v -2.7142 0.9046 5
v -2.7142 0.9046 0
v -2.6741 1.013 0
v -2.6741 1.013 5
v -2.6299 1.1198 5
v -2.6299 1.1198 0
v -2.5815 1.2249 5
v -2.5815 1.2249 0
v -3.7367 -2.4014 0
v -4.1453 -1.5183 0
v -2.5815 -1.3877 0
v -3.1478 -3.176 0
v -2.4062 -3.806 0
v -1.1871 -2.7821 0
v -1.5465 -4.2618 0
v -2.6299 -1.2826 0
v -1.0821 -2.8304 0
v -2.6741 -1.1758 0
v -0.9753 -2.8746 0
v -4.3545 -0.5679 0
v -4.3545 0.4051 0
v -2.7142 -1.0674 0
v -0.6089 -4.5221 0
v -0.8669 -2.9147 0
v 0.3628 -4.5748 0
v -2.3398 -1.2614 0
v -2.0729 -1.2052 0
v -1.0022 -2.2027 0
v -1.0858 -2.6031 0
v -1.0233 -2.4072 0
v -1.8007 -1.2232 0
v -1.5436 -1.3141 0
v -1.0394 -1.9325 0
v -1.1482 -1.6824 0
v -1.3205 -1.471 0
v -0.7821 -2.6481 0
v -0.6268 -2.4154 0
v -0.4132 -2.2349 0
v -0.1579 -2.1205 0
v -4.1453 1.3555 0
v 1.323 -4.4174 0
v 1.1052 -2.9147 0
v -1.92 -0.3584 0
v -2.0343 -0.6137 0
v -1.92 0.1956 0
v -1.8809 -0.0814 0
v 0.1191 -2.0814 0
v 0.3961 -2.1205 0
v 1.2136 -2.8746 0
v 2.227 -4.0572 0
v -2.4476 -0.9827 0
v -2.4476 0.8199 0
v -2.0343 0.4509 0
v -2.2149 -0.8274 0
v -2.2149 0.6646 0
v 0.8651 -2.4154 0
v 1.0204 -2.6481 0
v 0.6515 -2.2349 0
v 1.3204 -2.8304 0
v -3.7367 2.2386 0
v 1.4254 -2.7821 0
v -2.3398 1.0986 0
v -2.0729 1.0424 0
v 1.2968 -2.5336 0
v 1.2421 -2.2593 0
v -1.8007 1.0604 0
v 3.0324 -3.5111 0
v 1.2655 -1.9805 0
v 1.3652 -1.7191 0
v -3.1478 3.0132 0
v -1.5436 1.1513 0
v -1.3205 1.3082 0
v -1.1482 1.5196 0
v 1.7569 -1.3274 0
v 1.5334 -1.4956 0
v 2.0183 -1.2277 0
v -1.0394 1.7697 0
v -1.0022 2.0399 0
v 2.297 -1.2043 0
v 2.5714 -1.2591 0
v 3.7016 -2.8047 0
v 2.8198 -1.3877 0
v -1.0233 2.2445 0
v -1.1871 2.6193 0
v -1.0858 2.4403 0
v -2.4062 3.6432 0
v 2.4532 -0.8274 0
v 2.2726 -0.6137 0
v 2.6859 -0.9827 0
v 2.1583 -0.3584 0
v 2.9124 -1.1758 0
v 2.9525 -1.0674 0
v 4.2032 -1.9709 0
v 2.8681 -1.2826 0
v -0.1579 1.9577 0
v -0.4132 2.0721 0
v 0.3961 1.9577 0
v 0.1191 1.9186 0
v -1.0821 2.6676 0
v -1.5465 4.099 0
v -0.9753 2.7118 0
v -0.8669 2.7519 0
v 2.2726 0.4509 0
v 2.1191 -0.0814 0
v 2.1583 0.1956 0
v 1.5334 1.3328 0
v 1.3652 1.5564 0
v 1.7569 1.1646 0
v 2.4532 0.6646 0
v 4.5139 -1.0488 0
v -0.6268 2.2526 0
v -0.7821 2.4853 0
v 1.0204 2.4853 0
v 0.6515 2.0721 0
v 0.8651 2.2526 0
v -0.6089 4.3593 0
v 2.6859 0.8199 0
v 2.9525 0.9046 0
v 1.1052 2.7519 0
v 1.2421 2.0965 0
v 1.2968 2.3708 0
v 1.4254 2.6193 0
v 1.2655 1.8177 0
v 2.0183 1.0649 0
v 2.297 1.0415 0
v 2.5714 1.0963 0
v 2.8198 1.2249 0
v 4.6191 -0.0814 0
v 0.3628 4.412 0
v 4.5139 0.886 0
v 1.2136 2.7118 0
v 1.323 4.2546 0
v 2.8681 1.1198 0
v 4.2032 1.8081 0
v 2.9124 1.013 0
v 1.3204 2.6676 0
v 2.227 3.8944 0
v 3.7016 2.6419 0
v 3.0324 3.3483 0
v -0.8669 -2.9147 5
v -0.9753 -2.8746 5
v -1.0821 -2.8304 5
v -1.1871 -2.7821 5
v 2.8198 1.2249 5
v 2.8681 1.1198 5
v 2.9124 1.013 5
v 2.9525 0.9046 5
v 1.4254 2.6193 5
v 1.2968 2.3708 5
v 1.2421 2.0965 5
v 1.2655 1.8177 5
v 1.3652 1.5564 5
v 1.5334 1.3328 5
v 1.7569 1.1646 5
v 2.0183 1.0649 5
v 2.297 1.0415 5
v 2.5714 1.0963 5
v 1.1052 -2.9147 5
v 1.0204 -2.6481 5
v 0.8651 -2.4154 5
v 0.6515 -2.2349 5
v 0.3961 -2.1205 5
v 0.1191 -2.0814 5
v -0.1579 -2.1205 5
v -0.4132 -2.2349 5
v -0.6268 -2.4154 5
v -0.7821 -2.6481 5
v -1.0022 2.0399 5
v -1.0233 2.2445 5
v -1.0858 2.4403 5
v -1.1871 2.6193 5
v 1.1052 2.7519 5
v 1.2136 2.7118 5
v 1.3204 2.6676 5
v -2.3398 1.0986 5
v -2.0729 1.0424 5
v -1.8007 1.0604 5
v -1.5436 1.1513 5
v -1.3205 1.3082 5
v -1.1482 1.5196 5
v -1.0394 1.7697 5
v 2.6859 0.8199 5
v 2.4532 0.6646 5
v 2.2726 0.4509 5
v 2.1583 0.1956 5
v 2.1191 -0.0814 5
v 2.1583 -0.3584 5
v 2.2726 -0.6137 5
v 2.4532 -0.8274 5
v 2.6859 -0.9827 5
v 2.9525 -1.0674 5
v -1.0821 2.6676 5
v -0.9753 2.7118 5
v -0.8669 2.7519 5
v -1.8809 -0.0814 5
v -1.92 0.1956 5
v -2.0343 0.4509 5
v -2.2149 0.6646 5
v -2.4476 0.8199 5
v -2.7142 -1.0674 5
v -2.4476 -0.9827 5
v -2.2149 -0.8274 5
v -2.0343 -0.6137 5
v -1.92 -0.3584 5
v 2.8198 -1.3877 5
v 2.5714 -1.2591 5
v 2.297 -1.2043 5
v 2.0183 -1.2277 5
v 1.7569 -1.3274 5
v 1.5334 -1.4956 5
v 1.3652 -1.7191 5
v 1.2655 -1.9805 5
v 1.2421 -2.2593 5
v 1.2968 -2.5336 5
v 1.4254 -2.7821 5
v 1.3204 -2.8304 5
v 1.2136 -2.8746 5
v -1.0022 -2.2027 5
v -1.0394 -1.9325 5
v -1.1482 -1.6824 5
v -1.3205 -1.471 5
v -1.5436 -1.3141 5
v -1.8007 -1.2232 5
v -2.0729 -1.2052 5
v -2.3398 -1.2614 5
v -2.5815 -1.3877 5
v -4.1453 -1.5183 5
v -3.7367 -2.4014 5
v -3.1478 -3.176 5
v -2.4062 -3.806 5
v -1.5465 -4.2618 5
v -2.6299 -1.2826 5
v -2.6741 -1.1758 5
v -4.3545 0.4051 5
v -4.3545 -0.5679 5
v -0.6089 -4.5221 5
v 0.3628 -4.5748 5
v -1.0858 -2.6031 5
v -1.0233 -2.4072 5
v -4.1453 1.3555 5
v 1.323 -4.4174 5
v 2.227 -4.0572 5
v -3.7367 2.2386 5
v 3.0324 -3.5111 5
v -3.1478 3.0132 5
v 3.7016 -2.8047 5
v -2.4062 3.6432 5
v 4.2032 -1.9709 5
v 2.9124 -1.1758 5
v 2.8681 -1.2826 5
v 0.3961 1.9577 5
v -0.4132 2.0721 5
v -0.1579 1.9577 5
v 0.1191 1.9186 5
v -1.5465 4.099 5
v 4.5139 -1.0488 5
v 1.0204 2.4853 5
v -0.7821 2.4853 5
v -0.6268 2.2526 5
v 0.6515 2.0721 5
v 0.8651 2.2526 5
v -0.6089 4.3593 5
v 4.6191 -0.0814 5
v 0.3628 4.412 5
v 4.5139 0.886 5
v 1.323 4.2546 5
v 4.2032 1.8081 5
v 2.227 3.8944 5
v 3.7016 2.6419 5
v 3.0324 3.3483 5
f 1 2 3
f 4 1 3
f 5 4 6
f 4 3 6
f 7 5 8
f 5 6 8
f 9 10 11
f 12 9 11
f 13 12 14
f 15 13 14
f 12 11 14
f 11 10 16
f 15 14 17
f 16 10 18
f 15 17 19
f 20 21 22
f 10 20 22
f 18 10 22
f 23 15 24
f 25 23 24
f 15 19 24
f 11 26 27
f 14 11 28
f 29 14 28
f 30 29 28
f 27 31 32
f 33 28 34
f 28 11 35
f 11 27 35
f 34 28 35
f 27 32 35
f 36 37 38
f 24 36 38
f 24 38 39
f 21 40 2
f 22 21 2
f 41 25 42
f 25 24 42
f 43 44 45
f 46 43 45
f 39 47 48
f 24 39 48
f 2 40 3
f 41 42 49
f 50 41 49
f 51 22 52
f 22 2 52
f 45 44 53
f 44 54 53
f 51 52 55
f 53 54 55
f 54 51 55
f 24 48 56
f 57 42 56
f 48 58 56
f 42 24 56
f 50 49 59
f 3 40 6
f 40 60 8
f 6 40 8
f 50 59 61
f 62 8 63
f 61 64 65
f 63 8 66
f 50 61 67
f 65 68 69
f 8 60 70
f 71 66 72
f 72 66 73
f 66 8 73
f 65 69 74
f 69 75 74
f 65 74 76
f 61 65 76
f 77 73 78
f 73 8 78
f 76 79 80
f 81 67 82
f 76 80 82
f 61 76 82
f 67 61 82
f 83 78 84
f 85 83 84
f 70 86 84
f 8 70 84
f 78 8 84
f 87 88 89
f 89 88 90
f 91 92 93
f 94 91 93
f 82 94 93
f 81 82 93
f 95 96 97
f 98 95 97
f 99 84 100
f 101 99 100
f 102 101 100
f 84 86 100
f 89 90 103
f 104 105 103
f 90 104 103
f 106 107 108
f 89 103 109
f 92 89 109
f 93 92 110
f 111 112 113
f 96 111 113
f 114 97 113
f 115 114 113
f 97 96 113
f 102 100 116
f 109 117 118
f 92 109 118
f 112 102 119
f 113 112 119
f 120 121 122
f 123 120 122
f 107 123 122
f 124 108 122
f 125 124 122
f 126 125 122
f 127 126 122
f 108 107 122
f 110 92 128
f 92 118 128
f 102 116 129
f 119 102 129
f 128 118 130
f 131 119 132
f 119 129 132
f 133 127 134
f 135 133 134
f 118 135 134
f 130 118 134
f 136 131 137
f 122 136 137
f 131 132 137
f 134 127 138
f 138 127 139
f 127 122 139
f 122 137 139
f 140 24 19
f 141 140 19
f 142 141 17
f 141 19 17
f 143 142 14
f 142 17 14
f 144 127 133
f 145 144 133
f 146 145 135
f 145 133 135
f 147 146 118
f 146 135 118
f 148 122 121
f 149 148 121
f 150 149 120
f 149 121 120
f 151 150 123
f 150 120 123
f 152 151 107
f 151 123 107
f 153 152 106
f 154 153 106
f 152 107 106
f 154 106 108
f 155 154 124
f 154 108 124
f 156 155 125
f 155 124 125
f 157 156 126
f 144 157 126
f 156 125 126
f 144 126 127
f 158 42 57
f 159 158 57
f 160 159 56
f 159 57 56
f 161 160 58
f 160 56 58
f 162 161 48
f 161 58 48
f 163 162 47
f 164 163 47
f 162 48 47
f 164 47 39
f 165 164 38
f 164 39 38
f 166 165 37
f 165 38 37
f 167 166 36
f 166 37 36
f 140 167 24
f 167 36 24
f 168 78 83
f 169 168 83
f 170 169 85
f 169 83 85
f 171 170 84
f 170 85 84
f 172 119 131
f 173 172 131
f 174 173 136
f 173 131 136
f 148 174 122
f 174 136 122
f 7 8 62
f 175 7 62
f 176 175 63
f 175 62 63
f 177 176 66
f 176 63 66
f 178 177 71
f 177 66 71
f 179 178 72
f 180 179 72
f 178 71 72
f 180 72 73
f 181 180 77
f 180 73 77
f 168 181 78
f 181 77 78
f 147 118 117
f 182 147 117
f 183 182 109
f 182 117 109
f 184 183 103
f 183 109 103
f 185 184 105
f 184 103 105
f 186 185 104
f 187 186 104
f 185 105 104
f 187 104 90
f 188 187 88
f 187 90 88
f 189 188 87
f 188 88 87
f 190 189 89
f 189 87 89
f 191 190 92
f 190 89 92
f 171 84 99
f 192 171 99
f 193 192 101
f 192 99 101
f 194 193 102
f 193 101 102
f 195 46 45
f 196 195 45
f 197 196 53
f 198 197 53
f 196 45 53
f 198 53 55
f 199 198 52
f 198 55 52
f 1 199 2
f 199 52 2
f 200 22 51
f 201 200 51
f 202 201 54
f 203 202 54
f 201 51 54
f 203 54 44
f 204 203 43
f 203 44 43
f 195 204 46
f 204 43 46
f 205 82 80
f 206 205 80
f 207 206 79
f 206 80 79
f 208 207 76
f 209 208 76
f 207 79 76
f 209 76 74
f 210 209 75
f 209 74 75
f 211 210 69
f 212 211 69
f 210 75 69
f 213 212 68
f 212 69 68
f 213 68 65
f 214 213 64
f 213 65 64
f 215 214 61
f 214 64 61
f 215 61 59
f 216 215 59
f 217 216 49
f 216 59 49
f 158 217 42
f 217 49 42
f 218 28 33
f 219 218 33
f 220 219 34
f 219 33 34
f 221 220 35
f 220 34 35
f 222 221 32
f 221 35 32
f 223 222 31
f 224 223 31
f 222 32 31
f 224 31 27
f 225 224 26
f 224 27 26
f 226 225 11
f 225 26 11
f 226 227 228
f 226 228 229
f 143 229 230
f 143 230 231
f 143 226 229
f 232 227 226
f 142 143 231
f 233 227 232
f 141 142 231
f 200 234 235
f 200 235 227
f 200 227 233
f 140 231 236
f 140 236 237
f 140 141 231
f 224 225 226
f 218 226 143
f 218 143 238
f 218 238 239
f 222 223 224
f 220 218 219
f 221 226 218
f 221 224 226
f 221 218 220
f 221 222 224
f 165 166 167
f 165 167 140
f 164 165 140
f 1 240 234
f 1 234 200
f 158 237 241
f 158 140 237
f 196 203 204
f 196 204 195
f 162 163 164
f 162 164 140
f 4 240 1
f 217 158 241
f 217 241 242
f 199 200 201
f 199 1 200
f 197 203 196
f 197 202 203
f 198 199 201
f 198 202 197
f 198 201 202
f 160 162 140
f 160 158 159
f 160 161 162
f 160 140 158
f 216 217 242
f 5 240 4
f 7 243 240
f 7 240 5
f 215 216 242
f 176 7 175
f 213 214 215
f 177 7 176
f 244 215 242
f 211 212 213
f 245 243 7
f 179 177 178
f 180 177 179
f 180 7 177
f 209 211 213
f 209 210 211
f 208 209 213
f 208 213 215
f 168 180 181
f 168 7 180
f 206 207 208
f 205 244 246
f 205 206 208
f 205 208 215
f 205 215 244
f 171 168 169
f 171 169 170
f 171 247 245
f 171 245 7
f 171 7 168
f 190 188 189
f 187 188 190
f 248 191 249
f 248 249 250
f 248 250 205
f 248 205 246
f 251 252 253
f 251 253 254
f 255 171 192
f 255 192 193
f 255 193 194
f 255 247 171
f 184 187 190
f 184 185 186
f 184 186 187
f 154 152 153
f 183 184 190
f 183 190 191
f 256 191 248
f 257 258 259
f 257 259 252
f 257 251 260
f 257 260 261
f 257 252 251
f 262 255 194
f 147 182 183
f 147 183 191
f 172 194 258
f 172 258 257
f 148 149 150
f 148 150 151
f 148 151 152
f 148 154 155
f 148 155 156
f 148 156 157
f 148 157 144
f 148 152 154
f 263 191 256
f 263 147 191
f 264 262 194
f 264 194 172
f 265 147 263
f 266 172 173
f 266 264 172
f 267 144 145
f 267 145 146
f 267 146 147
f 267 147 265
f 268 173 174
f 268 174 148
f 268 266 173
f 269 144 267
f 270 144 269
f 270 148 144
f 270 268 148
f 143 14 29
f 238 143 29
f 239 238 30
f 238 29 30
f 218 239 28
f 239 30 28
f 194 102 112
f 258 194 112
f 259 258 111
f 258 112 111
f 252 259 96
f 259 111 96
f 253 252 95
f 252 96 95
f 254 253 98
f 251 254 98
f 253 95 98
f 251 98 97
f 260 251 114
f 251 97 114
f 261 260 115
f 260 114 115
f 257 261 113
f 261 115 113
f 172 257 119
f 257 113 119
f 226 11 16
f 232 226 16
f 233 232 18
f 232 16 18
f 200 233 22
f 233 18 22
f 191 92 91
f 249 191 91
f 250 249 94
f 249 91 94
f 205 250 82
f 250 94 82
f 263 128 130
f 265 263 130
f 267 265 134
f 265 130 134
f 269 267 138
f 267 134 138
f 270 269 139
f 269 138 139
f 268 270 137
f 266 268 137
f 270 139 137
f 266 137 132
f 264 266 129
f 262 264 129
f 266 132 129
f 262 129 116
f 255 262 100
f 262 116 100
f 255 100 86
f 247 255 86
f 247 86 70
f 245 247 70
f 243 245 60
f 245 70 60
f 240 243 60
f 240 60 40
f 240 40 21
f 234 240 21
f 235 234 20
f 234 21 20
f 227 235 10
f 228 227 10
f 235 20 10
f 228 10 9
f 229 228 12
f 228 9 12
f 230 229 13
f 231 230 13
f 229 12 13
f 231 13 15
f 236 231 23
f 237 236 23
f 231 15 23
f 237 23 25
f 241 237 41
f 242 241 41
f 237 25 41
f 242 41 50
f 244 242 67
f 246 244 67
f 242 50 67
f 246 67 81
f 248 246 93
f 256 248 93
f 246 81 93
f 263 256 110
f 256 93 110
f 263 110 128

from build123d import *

# Parameters (mm, degrees)
F0_R     = 4.5
F1_DEPTH = 5


with BuildPart() as f1:
    # F0 (on Top) → F1 (new body)
    with BuildSketch(Plane.XY):
        with Locations((0.1191368252, -0.0813986216)):
            Circle(F0_R)
        with BuildLine():
            ThreePointArc((2.8198227273, 1.224853903), (2.8907754227, 1.0666516755), (2.9524701585, 0.9046146756))
            ThreePointArc((2.9524701585, 0.9046146756), (3.7646340496, 0.6823639942), (4.1191368252, -0.0813986216))
            ThreePointArc((4.1191368252, -0.0813986216), (3.7646340496, -0.8451612374), (2.9524701585, -1.0674119188))
            ThreePointArc((2.9524701585, -1.0674119188), (2.8907754227, -1.2294489187), (2.8198227273, -1.3876511462))
            ThreePointArc((2.8198227273, -1.3876511462), (3.129098142, -1.7441154101), (3.2404571688, -2.2027189652))
            ThreePointArc((3.2404571688, -2.2027189652), (2.5445395433, -3.155364707), (1.4253893498, -2.7820845237))
            ThreePointArc((1.4253893498, -2.7820845237), (1.2671871223, -2.8530372191), (1.1051501224, -2.9147319549))
            ThreePointArc((1.1051501224, -2.9147319549), (1.1156340147, -2.9977723613), (1.1191368252, -3.0813986216))
            ThreePointArc((1.1191368252, -3.0813986216), (0.0355105649, -4.0778958111), (-0.866876472, -2.9147319549))
            ThreePointArc((-0.866876472, -2.9147319549), (-1.0289134719, -2.8530372191), (-1.1871156994, -2.7820845237))
            ThreePointArc((-1.1871156994, -2.7820845237), (-2.7092902995, -2.9098257463), (-2.5815490769, -1.3876511462))
            ThreePointArc((-2.5815490769, -1.3876511462), (-2.6525017723, -1.2294489187), (-2.7141965081, -1.0674119188))
            ThreePointArc((-2.7141965081, -1.0674119188), (-3.8808631748, -0.0813986216), (-2.7141965081, 0.9046146756))
            ThreePointArc((-2.7141965081, 0.9046146756), (-2.6525017723, 1.0666516755), (-2.5815490769, 1.224853903))
            ThreePointArc((-2.5815490769, 1.224853903), (-2.7092902995, 2.7470285031), (-1.1871156994, 2.6192872805))
            ThreePointArc((-1.1871156994, 2.6192872805), (-1.0289134719, 2.6902399759), (-0.866876472, 2.7519347117))
            ThreePointArc((-0.866876472, 2.7519347117), (0.0355105649, 3.9150985679), (1.1191368252, 2.9186013784))
            ThreePointArc((1.1191368252, 2.9186013784), (1.1156340147, 2.8349751181), (1.1051501224, 2.7519347117))
            ThreePointArc((1.1051501224, 2.7519347117), (1.2671871223, 2.6902399759), (1.4253893498, 2.6192872805))
            ThreePointArc((1.4253893498, 2.6192872805), (2.5445395433, 2.9925674638), (3.2404571688, 2.039921722))
            ThreePointArc((3.2404571688, 2.039921722), (3.129098142, 1.5813181669), (2.8198227273, 1.224853903))
        make_face(mode=Mode.SUBTRACT)
        with BuildLine():
            ThreePointArc((2.9524701585, -1.0674119188), (3.0771767168, -0.5813986216), (3.1191368252, -0.0813986216))
            ThreePointArc((3.1191368252, -0.0813986216), (3.0771767168, 0.4186013784), (2.9524701585, 0.9046146756))
            ThreePointArc((2.9524701585, 0.9046146756), (2.1191368252, -0.0813986216), (2.9524701585, -1.0674119188))
        make_face()
        with BuildLine():
            ThreePointArc((2.9524701585, 0.9046146756), (3.0771767168, 0.4186013784), (3.1191368252, -0.0813986216))
            ThreePointArc((3.1191368252, -0.0813986216), (3.0771767168, -0.5813986216), (2.9524701585, -1.0674119188))
            ThreePointArc((2.9524701585, -1.0674119188), (3.7646340496, -0.8451612374), (4.1191368252, -0.0813986216))
            ThreePointArc((4.1191368252, -0.0813986216), (3.7646340496, 0.6823639942), (2.9524701585, 0.9046146756))
        make_face()
        with BuildLine():
            ThreePointArc((1.4253893498, 2.6192872805), (1.5333503876, 1.3328149408), (2.8198227273, 1.224853903))
            ThreePointArc((2.8198227273, 1.224853903), (2.2404571688, 2.039921722), (1.4253893498, 2.6192872805))
        make_face()
        with BuildLine():
            ThreePointArc((1.4253893498, 2.6192872805), (2.2404571688, 2.039921722), (2.8198227273, 1.224853903))
            ThreePointArc((2.8198227273, 1.224853903), (3.129098142, 1.5813181669), (3.2404571688, 2.039921722))
            ThreePointArc((3.2404571688, 2.039921722), (2.5445395433, 2.9925674638), (1.4253893498, 2.6192872805))
        make_face()
        with BuildLine():
            ThreePointArc((3.2404571688, -2.2027189652), (3.129098142, -1.7441154101), (2.8198227273, -1.3876511462))
            ThreePointArc((2.8198227273, -1.3876511462), (2.2404571688, -2.2027189652), (1.4253893498, -2.7820845237))
            ThreePointArc((1.4253893498, -2.7820845237), (2.5445395433, -3.155364707), (3.2404571688, -2.2027189652))
        make_face()
        with BuildLine():
            ThreePointArc((1.4253893498, -2.7820845237), (2.2404571688, -2.2027189652), (2.8198227273, -1.3876511462))
            ThreePointArc((2.8198227273, -1.3876511462), (1.5333503876, -1.495612184), (1.4253893498, -2.7820845237))
        make_face()
        with BuildLine():
            ThreePointArc((-0.866876472, 2.7519347117), (0.1191368252, 1.9186013784), (1.1051501224, 2.7519347117))
            ThreePointArc((1.1051501224, 2.7519347117), (0.1191368252, 2.9186013784), (-0.866876472, 2.7519347117))
        make_face()
        with BuildLine():
            ThreePointArc((-0.866876472, 2.7519347117), (0.1191368252, 2.9186013784), (1.1051501224, 2.7519347117))
            ThreePointArc((1.1051501224, 2.7519347117), (1.1156340147, 2.8349751181), (1.1191368252, 2.9186013784))
            ThreePointArc((1.1191368252, 2.9186013784), (0.0355105649, 3.9150985679), (-0.866876472, 2.7519347117))
        make_face()
        with BuildLine():
            ThreePointArc((1.1191368252, -3.0813986216), (1.1156340147, -2.9977723613), (1.1051501224, -2.9147319549))
            ThreePointArc((1.1051501224, -2.9147319549), (0.1191368252, -3.0813986216), (-0.866876472, -2.9147319549))
            ThreePointArc((-0.866876472, -2.9147319549), (0.0355105649, -4.0778958111), (1.1191368252, -3.0813986216))
        make_face()
        with BuildLine():
            ThreePointArc((-0.866876472, -2.9147319549), (0.1191368252, -3.0813986216), (1.1051501224, -2.9147319549))
            ThreePointArc((1.1051501224, -2.9147319549), (0.1191368252, -2.0813986216), (-0.866876472, -2.9147319549))
        make_face()
        with BuildLine():
            ThreePointArc((-1.0021835184, 2.039921722), (-1.0495377765, 2.3440040965), (-1.1871156994, 2.6192872805))
            ThreePointArc((-1.1871156994, 2.6192872805), (-2.0021835184, 2.039921722), (-2.5815490769, 1.224853903))
            ThreePointArc((-2.5815490769, 1.224853903), (-1.5435799633, 1.1512807487), (-1.0021835184, 2.039921722))
        make_face()
        with BuildLine():
            ThreePointArc((-2.5815490769, 1.224853903), (-2.0021835184, 2.039921722), (-1.1871156994, 2.6192872805))
            ThreePointArc((-1.1871156994, 2.6192872805), (-2.7092902995, 2.7470285031), (-2.5815490769, 1.224853903))
        make_face()
        with BuildLine():
            ThreePointArc((-2.5815490769, -1.3876511462), (-2.7092902995, -2.9098257463), (-1.1871156994, -2.7820845237))
            ThreePointArc((-1.1871156994, -2.7820845237), (-2.0021835184, -2.2027189652), (-2.5815490769, -1.3876511462))
        make_face()
        with BuildLine():
            ThreePointArc((-2.5815490769, -1.3876511462), (-2.0021835184, -2.2027189652), (-1.1871156994, -2.7820845237))
            ThreePointArc((-1.1871156994, -2.7820845237), (-1.0495377765, -2.5068013397), (-1.0021835184, -2.2027189652))
            ThreePointArc((-1.0021835184, -2.2027189652), (-1.5435799633, -1.3140779919), (-2.5815490769, -1.3876511462))
        make_face()
        with BuildLine():
            ThreePointArc((-1.8808631748, -0.0813986216), (-2.117100559, 0.5640986028), (-2.7141965081, 0.9046146756))
            ThreePointArc((-2.7141965081, 0.9046146756), (-2.8808631748, -0.0813986216), (-2.7141965081, -1.0674119188))
            ThreePointArc((-2.7141965081, -1.0674119188), (-2.117100559, -0.726895846), (-1.8808631748, -0.0813986216))
        make_face()
        with BuildLine():
            ThreePointArc((-2.7141965081, -1.0674119188), (-2.8808631748, -0.0813986216), (-2.7141965081, 0.9046146756))
            ThreePointArc((-2.7141965081, 0.9046146756), (-3.8808631748, -0.0813986216), (-2.7141965081, -1.0674119188))
        make_face()
    extrude(amount=F1_DEPTH)


solid = f1.part
